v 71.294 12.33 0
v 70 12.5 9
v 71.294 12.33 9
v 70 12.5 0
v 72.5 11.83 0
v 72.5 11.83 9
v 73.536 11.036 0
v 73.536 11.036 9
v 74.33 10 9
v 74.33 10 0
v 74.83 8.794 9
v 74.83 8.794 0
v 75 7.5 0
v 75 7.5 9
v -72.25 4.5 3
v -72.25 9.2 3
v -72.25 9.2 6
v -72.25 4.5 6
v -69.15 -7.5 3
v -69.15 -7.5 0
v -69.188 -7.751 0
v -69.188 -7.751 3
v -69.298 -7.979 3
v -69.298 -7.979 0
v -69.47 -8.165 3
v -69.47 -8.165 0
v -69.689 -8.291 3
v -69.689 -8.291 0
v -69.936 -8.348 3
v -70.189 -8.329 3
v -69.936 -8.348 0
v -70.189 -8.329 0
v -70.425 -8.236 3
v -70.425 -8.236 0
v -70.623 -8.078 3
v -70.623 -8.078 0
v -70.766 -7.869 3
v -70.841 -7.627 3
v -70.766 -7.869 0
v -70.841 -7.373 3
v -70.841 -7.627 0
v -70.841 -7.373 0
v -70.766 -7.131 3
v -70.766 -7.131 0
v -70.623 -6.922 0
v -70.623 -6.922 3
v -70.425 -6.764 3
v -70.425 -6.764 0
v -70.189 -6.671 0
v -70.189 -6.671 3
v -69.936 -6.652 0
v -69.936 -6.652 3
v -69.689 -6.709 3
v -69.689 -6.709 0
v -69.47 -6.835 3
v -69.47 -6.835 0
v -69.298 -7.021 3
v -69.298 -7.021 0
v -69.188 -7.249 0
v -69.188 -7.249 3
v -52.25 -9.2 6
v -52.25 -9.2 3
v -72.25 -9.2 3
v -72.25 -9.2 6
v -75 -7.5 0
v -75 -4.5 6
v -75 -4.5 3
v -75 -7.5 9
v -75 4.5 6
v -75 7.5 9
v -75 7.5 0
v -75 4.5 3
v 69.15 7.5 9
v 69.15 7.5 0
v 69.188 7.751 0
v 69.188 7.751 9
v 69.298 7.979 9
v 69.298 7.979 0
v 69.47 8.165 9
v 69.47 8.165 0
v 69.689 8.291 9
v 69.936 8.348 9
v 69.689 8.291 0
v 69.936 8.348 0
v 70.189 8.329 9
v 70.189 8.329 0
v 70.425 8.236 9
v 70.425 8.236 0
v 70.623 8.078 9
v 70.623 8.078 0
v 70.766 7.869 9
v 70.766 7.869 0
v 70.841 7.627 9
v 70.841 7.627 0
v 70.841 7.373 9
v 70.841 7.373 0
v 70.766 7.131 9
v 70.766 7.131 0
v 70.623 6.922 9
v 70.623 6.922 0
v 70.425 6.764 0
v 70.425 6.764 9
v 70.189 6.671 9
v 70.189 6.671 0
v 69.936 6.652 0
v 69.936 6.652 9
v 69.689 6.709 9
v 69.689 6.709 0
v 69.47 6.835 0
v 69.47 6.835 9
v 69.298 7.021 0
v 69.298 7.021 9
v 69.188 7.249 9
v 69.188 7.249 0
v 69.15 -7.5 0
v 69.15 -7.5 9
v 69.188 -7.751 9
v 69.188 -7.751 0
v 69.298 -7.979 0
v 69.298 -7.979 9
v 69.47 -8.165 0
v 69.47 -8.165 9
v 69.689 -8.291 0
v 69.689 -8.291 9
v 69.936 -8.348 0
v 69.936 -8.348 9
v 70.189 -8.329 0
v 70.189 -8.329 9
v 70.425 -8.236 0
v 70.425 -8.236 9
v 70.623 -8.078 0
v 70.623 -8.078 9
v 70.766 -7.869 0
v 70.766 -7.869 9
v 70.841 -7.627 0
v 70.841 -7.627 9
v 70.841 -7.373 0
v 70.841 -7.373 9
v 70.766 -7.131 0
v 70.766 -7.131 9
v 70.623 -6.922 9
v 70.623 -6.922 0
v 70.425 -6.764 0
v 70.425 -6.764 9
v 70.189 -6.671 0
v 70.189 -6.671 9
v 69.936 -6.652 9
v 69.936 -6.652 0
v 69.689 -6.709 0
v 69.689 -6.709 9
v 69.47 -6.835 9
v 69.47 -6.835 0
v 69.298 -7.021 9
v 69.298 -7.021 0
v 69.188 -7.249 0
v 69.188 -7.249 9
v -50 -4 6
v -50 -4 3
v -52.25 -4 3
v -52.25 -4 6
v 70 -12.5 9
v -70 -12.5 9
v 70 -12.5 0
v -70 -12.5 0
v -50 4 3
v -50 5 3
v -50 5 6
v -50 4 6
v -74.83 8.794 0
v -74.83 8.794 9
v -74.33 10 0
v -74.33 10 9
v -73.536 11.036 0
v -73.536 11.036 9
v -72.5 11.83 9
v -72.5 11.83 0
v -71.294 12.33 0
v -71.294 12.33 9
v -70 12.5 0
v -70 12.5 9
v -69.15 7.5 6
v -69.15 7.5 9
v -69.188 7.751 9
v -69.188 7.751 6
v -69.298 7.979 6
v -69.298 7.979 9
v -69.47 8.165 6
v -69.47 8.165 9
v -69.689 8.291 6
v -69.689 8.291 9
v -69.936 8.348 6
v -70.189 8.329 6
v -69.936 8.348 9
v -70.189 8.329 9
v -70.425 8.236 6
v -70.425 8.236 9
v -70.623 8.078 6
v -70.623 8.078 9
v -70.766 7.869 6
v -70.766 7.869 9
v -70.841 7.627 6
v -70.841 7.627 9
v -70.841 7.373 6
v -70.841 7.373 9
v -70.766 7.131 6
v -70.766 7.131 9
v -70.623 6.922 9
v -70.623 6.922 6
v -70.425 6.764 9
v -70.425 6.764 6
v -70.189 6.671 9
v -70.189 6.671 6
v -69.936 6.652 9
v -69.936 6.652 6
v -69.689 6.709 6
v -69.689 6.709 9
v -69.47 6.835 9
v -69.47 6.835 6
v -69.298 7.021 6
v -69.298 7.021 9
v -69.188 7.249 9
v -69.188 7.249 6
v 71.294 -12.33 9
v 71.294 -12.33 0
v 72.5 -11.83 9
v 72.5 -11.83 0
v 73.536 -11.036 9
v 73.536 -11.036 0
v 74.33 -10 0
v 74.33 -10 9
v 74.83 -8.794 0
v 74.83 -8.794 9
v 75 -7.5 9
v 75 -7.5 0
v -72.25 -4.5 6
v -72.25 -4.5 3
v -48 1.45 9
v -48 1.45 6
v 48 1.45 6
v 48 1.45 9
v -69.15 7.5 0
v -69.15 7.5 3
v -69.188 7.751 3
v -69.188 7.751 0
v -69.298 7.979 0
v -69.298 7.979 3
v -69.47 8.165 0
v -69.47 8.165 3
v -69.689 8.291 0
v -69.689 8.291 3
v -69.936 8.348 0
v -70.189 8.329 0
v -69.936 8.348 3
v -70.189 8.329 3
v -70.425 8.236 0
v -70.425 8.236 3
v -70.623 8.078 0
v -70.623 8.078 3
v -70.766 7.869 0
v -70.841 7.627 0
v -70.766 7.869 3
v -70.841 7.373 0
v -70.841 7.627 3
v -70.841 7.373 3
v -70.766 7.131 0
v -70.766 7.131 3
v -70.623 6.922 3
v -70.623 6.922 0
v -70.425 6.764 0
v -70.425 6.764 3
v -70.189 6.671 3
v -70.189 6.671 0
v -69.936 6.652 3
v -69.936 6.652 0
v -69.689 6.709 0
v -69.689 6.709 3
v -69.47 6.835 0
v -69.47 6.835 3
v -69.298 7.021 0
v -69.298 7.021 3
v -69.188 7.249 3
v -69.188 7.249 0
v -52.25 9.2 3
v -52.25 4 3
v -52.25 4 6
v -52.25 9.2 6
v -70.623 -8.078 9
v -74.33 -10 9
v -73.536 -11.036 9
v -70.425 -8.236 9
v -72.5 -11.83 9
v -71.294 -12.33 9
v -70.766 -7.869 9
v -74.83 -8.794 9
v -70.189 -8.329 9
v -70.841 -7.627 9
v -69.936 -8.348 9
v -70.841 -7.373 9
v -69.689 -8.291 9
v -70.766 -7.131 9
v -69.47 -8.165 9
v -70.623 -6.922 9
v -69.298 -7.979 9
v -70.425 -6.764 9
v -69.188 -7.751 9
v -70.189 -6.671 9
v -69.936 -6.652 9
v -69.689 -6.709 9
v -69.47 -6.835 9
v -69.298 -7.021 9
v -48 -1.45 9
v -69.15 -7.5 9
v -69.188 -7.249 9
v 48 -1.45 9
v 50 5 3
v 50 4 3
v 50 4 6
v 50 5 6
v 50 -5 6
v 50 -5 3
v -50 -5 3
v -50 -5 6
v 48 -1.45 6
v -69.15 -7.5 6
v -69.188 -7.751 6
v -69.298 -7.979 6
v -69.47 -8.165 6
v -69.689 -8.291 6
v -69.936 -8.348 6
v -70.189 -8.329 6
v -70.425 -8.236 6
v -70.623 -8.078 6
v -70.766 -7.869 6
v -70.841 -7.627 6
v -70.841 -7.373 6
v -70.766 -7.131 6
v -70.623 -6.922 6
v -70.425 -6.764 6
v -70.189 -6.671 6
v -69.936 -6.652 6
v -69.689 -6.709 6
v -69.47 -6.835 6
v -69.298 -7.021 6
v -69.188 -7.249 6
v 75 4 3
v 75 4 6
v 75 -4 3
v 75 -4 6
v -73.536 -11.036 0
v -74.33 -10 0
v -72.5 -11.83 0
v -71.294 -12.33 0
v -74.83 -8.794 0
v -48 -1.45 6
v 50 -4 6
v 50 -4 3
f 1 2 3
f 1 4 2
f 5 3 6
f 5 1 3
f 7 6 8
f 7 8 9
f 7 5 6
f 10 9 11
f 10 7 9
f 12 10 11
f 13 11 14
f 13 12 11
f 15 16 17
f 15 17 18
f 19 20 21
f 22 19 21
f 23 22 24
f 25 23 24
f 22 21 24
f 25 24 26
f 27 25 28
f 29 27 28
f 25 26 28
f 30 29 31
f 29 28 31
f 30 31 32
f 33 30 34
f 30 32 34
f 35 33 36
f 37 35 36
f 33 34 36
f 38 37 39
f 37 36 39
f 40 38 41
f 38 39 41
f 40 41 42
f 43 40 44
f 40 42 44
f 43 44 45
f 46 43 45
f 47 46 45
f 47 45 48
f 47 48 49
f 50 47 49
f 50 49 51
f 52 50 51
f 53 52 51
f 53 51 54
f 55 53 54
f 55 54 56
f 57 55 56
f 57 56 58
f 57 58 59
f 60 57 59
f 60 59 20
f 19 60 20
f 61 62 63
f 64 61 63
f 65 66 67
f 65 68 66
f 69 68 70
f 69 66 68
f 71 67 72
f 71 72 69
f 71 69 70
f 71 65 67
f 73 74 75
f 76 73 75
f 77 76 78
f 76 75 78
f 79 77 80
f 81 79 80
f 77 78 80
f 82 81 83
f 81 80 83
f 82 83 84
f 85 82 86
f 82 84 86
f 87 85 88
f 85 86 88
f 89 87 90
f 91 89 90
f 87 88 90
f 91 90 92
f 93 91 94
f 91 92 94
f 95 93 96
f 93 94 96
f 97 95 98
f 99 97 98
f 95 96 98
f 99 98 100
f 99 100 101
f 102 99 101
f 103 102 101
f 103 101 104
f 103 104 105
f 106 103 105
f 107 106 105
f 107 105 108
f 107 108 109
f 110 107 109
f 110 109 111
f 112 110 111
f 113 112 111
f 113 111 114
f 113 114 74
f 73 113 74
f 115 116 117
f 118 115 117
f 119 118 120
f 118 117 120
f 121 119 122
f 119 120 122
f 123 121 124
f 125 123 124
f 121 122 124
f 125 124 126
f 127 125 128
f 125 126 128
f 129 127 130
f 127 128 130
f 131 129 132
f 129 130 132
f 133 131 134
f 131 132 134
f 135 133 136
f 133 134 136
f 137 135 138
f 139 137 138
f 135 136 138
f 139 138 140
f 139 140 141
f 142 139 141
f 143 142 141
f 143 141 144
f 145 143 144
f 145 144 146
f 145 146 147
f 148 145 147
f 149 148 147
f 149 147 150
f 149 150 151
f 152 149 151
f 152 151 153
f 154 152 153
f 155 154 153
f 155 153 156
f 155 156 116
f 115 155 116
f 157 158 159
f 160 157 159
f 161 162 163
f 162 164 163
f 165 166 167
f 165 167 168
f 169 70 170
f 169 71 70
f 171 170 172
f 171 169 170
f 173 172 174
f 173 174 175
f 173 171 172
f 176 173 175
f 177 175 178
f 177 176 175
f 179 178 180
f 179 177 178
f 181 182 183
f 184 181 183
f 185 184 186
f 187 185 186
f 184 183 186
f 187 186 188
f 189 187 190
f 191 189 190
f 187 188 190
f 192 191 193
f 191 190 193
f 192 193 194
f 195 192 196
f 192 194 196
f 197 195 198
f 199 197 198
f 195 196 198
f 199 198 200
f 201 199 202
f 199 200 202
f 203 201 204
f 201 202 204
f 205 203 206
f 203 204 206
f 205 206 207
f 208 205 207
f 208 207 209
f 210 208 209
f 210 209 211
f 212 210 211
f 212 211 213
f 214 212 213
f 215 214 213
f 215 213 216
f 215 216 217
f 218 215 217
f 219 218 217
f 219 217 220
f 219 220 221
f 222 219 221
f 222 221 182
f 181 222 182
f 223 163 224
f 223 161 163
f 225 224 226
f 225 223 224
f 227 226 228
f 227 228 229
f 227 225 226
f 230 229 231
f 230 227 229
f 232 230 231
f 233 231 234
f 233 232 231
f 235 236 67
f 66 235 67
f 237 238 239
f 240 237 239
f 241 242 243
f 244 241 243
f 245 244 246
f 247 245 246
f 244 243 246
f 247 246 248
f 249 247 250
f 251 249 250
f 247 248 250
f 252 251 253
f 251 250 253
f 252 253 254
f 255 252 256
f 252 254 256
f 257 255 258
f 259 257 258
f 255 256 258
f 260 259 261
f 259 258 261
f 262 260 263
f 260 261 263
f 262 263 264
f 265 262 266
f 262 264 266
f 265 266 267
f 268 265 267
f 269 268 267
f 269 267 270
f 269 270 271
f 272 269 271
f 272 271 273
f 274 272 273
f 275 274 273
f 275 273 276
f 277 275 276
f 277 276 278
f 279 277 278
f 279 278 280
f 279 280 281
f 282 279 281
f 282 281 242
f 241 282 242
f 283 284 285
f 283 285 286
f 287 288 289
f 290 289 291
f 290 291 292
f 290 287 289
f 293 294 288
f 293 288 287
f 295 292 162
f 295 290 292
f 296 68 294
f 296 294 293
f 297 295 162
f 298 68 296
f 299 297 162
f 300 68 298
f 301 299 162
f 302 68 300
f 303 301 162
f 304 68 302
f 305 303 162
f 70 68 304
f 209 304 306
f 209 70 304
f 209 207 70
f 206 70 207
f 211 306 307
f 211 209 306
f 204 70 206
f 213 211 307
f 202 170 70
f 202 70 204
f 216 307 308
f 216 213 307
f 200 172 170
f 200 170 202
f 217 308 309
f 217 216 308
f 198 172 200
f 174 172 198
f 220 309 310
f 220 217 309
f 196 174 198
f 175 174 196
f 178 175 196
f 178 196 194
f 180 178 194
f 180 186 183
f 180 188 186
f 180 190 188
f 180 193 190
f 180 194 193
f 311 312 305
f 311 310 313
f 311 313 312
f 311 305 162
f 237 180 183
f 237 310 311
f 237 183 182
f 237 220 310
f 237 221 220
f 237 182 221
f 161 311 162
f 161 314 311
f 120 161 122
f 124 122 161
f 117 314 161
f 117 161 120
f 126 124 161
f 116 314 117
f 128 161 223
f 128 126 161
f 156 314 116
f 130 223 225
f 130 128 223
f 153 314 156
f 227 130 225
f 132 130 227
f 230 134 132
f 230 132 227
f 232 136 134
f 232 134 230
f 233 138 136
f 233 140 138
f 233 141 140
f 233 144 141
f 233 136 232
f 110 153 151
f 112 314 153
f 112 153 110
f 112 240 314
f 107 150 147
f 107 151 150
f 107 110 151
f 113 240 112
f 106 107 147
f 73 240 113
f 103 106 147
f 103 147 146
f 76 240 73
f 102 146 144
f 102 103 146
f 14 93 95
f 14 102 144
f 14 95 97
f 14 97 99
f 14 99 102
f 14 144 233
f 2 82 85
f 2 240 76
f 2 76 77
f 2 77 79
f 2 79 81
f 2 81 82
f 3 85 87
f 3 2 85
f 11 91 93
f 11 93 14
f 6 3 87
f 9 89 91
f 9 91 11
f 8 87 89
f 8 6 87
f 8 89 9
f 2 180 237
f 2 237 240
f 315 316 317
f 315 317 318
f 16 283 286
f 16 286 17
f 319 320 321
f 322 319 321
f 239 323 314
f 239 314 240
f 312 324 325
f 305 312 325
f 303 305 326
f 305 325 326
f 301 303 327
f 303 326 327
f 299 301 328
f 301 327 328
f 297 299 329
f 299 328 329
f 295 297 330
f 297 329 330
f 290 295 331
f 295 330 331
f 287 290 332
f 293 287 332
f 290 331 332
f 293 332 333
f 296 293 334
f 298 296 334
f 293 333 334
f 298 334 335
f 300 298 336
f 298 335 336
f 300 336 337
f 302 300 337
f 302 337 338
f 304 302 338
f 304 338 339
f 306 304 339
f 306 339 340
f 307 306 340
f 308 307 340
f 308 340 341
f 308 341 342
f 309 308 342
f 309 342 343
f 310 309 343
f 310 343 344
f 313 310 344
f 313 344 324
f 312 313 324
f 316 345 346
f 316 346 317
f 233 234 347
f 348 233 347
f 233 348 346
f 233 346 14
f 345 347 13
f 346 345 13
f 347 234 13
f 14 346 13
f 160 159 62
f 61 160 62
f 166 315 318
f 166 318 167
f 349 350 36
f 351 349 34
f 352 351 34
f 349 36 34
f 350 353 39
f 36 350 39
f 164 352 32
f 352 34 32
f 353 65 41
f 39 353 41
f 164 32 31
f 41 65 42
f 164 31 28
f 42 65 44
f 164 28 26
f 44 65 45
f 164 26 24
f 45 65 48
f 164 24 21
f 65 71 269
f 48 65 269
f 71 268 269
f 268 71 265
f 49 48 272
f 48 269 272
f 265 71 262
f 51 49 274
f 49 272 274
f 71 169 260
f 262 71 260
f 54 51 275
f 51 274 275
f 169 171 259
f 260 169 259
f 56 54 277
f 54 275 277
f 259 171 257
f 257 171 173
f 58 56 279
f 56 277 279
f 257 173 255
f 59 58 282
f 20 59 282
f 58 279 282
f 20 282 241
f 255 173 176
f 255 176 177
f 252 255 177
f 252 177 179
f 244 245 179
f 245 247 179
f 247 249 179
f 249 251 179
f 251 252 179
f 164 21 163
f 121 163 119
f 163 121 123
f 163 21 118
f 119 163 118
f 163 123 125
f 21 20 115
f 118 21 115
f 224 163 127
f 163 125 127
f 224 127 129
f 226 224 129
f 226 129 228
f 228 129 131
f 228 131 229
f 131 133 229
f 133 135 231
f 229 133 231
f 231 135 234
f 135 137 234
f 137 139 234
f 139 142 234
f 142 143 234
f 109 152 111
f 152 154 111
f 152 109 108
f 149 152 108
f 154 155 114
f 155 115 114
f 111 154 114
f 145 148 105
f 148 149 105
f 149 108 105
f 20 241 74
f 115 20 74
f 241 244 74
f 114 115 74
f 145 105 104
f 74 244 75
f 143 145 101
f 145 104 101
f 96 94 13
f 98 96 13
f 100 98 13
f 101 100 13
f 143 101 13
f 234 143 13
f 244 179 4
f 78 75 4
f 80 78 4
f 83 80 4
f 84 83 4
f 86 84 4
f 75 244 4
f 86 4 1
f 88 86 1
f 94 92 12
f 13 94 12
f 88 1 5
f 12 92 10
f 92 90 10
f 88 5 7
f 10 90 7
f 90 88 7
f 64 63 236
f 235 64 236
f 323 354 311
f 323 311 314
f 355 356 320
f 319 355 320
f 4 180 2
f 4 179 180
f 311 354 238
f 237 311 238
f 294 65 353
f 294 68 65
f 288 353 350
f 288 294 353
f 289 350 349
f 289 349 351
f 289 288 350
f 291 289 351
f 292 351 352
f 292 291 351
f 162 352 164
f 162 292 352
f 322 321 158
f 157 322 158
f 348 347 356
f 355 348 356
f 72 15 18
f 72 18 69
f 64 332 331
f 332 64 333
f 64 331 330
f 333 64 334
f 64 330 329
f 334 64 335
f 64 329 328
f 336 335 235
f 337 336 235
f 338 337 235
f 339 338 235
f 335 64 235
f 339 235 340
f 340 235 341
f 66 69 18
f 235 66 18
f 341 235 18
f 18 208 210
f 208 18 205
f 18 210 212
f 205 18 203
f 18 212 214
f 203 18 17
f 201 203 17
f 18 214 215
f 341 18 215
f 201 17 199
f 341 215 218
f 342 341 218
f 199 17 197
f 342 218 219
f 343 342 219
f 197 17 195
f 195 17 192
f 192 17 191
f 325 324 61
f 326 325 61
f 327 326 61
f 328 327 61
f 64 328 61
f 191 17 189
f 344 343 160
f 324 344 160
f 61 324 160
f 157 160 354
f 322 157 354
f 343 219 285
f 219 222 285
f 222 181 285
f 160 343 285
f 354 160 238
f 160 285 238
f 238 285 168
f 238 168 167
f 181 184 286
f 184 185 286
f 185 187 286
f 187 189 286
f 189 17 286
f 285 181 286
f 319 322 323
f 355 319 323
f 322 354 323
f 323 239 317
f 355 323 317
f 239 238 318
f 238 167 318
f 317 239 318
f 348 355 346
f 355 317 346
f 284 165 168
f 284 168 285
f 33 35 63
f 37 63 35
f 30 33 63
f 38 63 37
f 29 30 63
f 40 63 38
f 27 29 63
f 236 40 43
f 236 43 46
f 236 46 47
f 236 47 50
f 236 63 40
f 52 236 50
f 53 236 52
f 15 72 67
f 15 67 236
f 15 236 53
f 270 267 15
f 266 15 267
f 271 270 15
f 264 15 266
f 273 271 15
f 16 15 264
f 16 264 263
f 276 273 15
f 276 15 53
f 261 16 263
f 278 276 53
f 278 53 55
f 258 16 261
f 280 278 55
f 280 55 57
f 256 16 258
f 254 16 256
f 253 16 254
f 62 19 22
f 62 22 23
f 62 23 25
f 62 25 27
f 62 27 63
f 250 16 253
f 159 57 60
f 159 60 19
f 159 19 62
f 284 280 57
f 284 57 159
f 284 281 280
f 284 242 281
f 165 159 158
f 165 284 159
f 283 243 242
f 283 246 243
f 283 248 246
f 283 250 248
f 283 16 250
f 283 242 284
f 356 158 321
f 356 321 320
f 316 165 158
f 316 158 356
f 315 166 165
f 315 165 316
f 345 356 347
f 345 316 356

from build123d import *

# Parameters (mm, degrees)
SKETCH_W              = 150
SKETCH_H              = 25
PAD_DEPTH             = 3
PAD001_DEPTH          = 3
SKETCH004_W           = 150
SKETCH004_H           = 25
SKETCH004_W_2         = 96
SKETCH004_H_2         = 2.9
PAD002_DEPTH          = 3
SKETCH005_R           = 0.85
POCKET_DEPTH          = 313.671314
POLARPATTERN_COUNT    = 2
POLARPATTERN001_COUNT = 2
POLARPATTERN002_COUNT = 2
FILLET_R              = 5


with BuildPart() as part:
    # Sketch → Pad (new body)
    with BuildSketch(Plane.XY):
        Rectangle(SKETCH_W, SKETCH_H)
    extrude(amount=PAD_DEPTH)

    # Sketch001 (on Face6 of Pad) → Pad001 (join)
    with BuildSketch(Plane.XY.offset(3)):
        Polygon((-75, 12.5), (75, 12.5), (75, 4), (50, 4), (50, 5), (-50, 5), (-50, 4), (-52.25, 4), (-52.25, 9.2), (-72.25, 9.2), (-72.25, 4.5), (-75, 4.5), align=None)
        Polygon((-75, -12.5), (75, -12.5), (75, -4), (50, -4), (50, -5), (-50, -5), (-50, -4), (-52.25, -4), (-52.25, -9.2), (-72.25, -9.2), (-72.25, -4.5), (-75, -4.5), align=None)
    extrude(amount=PAD001_DEPTH)

    # Sketch004 (on Face12 of Pad001) → Pad002 (join)
    with BuildSketch(Plane.XY.offset(6)):
        Rectangle(SKETCH004_W, SKETCH004_H)
        Rectangle(SKETCH004_W_2, SKETCH004_H_2, mode=Mode.SUBTRACT)
    extrude(amount=PAD002_DEPTH)

    # Sketch005 (on Face34 of Pad002) → Pocket (cut, through all)
    with BuildSketch(Plane.XY.offset(9)):
        with Locations((-70, 7.5)):
            Circle(SKETCH005_R)
    pocket = extrude(amount=-POCKET_DEPTH, mode=Mode.SUBTRACT)

    # PolarPattern: Pocket ×2 about axis
    polarpattern_axis = Axis((0, 0, 9), (0, 0, 1))
    for i in range(1, POLARPATTERN_COUNT):
        add(pocket.rotate(polarpattern_axis, i * 360 / POLARPATTERN_COUNT), mode=Mode.SUBTRACT)

    # PolarPattern001: Pocket ×2 about axis
    polarpattern001_axis = Axis((0, 0, 0), (0, 1, 0))
    for i in range(1, POLARPATTERN001_COUNT):
        add(pocket.rotate(polarpattern001_axis, i * 360 / POLARPATTERN001_COUNT), mode=Mode.SUBTRACT)

    # PolarPattern002: Pocket ×2 about axis
    polarpattern002_axis = Axis((0, 0, 0), (1, 0, 0))
    for i in range(1, POLARPATTERN002_COUNT):
        add(pocket.rotate(polarpattern002_axis, i * 360 / POLARPATTERN002_COUNT), mode=Mode.SUBTRACT)

    # Fillet
    fillet_edges = [part.edges().sort_by_distance(p)[0] for p in [
        (75, -12.5, 7.5),
        (75, 12.5, 7.5),
        (-75, -12.5, 7.5),
        (-75, 12.5, 7.5),
    ]]
    fillet(fillet_edges, radius=FILLET_R)


solid = part.part
